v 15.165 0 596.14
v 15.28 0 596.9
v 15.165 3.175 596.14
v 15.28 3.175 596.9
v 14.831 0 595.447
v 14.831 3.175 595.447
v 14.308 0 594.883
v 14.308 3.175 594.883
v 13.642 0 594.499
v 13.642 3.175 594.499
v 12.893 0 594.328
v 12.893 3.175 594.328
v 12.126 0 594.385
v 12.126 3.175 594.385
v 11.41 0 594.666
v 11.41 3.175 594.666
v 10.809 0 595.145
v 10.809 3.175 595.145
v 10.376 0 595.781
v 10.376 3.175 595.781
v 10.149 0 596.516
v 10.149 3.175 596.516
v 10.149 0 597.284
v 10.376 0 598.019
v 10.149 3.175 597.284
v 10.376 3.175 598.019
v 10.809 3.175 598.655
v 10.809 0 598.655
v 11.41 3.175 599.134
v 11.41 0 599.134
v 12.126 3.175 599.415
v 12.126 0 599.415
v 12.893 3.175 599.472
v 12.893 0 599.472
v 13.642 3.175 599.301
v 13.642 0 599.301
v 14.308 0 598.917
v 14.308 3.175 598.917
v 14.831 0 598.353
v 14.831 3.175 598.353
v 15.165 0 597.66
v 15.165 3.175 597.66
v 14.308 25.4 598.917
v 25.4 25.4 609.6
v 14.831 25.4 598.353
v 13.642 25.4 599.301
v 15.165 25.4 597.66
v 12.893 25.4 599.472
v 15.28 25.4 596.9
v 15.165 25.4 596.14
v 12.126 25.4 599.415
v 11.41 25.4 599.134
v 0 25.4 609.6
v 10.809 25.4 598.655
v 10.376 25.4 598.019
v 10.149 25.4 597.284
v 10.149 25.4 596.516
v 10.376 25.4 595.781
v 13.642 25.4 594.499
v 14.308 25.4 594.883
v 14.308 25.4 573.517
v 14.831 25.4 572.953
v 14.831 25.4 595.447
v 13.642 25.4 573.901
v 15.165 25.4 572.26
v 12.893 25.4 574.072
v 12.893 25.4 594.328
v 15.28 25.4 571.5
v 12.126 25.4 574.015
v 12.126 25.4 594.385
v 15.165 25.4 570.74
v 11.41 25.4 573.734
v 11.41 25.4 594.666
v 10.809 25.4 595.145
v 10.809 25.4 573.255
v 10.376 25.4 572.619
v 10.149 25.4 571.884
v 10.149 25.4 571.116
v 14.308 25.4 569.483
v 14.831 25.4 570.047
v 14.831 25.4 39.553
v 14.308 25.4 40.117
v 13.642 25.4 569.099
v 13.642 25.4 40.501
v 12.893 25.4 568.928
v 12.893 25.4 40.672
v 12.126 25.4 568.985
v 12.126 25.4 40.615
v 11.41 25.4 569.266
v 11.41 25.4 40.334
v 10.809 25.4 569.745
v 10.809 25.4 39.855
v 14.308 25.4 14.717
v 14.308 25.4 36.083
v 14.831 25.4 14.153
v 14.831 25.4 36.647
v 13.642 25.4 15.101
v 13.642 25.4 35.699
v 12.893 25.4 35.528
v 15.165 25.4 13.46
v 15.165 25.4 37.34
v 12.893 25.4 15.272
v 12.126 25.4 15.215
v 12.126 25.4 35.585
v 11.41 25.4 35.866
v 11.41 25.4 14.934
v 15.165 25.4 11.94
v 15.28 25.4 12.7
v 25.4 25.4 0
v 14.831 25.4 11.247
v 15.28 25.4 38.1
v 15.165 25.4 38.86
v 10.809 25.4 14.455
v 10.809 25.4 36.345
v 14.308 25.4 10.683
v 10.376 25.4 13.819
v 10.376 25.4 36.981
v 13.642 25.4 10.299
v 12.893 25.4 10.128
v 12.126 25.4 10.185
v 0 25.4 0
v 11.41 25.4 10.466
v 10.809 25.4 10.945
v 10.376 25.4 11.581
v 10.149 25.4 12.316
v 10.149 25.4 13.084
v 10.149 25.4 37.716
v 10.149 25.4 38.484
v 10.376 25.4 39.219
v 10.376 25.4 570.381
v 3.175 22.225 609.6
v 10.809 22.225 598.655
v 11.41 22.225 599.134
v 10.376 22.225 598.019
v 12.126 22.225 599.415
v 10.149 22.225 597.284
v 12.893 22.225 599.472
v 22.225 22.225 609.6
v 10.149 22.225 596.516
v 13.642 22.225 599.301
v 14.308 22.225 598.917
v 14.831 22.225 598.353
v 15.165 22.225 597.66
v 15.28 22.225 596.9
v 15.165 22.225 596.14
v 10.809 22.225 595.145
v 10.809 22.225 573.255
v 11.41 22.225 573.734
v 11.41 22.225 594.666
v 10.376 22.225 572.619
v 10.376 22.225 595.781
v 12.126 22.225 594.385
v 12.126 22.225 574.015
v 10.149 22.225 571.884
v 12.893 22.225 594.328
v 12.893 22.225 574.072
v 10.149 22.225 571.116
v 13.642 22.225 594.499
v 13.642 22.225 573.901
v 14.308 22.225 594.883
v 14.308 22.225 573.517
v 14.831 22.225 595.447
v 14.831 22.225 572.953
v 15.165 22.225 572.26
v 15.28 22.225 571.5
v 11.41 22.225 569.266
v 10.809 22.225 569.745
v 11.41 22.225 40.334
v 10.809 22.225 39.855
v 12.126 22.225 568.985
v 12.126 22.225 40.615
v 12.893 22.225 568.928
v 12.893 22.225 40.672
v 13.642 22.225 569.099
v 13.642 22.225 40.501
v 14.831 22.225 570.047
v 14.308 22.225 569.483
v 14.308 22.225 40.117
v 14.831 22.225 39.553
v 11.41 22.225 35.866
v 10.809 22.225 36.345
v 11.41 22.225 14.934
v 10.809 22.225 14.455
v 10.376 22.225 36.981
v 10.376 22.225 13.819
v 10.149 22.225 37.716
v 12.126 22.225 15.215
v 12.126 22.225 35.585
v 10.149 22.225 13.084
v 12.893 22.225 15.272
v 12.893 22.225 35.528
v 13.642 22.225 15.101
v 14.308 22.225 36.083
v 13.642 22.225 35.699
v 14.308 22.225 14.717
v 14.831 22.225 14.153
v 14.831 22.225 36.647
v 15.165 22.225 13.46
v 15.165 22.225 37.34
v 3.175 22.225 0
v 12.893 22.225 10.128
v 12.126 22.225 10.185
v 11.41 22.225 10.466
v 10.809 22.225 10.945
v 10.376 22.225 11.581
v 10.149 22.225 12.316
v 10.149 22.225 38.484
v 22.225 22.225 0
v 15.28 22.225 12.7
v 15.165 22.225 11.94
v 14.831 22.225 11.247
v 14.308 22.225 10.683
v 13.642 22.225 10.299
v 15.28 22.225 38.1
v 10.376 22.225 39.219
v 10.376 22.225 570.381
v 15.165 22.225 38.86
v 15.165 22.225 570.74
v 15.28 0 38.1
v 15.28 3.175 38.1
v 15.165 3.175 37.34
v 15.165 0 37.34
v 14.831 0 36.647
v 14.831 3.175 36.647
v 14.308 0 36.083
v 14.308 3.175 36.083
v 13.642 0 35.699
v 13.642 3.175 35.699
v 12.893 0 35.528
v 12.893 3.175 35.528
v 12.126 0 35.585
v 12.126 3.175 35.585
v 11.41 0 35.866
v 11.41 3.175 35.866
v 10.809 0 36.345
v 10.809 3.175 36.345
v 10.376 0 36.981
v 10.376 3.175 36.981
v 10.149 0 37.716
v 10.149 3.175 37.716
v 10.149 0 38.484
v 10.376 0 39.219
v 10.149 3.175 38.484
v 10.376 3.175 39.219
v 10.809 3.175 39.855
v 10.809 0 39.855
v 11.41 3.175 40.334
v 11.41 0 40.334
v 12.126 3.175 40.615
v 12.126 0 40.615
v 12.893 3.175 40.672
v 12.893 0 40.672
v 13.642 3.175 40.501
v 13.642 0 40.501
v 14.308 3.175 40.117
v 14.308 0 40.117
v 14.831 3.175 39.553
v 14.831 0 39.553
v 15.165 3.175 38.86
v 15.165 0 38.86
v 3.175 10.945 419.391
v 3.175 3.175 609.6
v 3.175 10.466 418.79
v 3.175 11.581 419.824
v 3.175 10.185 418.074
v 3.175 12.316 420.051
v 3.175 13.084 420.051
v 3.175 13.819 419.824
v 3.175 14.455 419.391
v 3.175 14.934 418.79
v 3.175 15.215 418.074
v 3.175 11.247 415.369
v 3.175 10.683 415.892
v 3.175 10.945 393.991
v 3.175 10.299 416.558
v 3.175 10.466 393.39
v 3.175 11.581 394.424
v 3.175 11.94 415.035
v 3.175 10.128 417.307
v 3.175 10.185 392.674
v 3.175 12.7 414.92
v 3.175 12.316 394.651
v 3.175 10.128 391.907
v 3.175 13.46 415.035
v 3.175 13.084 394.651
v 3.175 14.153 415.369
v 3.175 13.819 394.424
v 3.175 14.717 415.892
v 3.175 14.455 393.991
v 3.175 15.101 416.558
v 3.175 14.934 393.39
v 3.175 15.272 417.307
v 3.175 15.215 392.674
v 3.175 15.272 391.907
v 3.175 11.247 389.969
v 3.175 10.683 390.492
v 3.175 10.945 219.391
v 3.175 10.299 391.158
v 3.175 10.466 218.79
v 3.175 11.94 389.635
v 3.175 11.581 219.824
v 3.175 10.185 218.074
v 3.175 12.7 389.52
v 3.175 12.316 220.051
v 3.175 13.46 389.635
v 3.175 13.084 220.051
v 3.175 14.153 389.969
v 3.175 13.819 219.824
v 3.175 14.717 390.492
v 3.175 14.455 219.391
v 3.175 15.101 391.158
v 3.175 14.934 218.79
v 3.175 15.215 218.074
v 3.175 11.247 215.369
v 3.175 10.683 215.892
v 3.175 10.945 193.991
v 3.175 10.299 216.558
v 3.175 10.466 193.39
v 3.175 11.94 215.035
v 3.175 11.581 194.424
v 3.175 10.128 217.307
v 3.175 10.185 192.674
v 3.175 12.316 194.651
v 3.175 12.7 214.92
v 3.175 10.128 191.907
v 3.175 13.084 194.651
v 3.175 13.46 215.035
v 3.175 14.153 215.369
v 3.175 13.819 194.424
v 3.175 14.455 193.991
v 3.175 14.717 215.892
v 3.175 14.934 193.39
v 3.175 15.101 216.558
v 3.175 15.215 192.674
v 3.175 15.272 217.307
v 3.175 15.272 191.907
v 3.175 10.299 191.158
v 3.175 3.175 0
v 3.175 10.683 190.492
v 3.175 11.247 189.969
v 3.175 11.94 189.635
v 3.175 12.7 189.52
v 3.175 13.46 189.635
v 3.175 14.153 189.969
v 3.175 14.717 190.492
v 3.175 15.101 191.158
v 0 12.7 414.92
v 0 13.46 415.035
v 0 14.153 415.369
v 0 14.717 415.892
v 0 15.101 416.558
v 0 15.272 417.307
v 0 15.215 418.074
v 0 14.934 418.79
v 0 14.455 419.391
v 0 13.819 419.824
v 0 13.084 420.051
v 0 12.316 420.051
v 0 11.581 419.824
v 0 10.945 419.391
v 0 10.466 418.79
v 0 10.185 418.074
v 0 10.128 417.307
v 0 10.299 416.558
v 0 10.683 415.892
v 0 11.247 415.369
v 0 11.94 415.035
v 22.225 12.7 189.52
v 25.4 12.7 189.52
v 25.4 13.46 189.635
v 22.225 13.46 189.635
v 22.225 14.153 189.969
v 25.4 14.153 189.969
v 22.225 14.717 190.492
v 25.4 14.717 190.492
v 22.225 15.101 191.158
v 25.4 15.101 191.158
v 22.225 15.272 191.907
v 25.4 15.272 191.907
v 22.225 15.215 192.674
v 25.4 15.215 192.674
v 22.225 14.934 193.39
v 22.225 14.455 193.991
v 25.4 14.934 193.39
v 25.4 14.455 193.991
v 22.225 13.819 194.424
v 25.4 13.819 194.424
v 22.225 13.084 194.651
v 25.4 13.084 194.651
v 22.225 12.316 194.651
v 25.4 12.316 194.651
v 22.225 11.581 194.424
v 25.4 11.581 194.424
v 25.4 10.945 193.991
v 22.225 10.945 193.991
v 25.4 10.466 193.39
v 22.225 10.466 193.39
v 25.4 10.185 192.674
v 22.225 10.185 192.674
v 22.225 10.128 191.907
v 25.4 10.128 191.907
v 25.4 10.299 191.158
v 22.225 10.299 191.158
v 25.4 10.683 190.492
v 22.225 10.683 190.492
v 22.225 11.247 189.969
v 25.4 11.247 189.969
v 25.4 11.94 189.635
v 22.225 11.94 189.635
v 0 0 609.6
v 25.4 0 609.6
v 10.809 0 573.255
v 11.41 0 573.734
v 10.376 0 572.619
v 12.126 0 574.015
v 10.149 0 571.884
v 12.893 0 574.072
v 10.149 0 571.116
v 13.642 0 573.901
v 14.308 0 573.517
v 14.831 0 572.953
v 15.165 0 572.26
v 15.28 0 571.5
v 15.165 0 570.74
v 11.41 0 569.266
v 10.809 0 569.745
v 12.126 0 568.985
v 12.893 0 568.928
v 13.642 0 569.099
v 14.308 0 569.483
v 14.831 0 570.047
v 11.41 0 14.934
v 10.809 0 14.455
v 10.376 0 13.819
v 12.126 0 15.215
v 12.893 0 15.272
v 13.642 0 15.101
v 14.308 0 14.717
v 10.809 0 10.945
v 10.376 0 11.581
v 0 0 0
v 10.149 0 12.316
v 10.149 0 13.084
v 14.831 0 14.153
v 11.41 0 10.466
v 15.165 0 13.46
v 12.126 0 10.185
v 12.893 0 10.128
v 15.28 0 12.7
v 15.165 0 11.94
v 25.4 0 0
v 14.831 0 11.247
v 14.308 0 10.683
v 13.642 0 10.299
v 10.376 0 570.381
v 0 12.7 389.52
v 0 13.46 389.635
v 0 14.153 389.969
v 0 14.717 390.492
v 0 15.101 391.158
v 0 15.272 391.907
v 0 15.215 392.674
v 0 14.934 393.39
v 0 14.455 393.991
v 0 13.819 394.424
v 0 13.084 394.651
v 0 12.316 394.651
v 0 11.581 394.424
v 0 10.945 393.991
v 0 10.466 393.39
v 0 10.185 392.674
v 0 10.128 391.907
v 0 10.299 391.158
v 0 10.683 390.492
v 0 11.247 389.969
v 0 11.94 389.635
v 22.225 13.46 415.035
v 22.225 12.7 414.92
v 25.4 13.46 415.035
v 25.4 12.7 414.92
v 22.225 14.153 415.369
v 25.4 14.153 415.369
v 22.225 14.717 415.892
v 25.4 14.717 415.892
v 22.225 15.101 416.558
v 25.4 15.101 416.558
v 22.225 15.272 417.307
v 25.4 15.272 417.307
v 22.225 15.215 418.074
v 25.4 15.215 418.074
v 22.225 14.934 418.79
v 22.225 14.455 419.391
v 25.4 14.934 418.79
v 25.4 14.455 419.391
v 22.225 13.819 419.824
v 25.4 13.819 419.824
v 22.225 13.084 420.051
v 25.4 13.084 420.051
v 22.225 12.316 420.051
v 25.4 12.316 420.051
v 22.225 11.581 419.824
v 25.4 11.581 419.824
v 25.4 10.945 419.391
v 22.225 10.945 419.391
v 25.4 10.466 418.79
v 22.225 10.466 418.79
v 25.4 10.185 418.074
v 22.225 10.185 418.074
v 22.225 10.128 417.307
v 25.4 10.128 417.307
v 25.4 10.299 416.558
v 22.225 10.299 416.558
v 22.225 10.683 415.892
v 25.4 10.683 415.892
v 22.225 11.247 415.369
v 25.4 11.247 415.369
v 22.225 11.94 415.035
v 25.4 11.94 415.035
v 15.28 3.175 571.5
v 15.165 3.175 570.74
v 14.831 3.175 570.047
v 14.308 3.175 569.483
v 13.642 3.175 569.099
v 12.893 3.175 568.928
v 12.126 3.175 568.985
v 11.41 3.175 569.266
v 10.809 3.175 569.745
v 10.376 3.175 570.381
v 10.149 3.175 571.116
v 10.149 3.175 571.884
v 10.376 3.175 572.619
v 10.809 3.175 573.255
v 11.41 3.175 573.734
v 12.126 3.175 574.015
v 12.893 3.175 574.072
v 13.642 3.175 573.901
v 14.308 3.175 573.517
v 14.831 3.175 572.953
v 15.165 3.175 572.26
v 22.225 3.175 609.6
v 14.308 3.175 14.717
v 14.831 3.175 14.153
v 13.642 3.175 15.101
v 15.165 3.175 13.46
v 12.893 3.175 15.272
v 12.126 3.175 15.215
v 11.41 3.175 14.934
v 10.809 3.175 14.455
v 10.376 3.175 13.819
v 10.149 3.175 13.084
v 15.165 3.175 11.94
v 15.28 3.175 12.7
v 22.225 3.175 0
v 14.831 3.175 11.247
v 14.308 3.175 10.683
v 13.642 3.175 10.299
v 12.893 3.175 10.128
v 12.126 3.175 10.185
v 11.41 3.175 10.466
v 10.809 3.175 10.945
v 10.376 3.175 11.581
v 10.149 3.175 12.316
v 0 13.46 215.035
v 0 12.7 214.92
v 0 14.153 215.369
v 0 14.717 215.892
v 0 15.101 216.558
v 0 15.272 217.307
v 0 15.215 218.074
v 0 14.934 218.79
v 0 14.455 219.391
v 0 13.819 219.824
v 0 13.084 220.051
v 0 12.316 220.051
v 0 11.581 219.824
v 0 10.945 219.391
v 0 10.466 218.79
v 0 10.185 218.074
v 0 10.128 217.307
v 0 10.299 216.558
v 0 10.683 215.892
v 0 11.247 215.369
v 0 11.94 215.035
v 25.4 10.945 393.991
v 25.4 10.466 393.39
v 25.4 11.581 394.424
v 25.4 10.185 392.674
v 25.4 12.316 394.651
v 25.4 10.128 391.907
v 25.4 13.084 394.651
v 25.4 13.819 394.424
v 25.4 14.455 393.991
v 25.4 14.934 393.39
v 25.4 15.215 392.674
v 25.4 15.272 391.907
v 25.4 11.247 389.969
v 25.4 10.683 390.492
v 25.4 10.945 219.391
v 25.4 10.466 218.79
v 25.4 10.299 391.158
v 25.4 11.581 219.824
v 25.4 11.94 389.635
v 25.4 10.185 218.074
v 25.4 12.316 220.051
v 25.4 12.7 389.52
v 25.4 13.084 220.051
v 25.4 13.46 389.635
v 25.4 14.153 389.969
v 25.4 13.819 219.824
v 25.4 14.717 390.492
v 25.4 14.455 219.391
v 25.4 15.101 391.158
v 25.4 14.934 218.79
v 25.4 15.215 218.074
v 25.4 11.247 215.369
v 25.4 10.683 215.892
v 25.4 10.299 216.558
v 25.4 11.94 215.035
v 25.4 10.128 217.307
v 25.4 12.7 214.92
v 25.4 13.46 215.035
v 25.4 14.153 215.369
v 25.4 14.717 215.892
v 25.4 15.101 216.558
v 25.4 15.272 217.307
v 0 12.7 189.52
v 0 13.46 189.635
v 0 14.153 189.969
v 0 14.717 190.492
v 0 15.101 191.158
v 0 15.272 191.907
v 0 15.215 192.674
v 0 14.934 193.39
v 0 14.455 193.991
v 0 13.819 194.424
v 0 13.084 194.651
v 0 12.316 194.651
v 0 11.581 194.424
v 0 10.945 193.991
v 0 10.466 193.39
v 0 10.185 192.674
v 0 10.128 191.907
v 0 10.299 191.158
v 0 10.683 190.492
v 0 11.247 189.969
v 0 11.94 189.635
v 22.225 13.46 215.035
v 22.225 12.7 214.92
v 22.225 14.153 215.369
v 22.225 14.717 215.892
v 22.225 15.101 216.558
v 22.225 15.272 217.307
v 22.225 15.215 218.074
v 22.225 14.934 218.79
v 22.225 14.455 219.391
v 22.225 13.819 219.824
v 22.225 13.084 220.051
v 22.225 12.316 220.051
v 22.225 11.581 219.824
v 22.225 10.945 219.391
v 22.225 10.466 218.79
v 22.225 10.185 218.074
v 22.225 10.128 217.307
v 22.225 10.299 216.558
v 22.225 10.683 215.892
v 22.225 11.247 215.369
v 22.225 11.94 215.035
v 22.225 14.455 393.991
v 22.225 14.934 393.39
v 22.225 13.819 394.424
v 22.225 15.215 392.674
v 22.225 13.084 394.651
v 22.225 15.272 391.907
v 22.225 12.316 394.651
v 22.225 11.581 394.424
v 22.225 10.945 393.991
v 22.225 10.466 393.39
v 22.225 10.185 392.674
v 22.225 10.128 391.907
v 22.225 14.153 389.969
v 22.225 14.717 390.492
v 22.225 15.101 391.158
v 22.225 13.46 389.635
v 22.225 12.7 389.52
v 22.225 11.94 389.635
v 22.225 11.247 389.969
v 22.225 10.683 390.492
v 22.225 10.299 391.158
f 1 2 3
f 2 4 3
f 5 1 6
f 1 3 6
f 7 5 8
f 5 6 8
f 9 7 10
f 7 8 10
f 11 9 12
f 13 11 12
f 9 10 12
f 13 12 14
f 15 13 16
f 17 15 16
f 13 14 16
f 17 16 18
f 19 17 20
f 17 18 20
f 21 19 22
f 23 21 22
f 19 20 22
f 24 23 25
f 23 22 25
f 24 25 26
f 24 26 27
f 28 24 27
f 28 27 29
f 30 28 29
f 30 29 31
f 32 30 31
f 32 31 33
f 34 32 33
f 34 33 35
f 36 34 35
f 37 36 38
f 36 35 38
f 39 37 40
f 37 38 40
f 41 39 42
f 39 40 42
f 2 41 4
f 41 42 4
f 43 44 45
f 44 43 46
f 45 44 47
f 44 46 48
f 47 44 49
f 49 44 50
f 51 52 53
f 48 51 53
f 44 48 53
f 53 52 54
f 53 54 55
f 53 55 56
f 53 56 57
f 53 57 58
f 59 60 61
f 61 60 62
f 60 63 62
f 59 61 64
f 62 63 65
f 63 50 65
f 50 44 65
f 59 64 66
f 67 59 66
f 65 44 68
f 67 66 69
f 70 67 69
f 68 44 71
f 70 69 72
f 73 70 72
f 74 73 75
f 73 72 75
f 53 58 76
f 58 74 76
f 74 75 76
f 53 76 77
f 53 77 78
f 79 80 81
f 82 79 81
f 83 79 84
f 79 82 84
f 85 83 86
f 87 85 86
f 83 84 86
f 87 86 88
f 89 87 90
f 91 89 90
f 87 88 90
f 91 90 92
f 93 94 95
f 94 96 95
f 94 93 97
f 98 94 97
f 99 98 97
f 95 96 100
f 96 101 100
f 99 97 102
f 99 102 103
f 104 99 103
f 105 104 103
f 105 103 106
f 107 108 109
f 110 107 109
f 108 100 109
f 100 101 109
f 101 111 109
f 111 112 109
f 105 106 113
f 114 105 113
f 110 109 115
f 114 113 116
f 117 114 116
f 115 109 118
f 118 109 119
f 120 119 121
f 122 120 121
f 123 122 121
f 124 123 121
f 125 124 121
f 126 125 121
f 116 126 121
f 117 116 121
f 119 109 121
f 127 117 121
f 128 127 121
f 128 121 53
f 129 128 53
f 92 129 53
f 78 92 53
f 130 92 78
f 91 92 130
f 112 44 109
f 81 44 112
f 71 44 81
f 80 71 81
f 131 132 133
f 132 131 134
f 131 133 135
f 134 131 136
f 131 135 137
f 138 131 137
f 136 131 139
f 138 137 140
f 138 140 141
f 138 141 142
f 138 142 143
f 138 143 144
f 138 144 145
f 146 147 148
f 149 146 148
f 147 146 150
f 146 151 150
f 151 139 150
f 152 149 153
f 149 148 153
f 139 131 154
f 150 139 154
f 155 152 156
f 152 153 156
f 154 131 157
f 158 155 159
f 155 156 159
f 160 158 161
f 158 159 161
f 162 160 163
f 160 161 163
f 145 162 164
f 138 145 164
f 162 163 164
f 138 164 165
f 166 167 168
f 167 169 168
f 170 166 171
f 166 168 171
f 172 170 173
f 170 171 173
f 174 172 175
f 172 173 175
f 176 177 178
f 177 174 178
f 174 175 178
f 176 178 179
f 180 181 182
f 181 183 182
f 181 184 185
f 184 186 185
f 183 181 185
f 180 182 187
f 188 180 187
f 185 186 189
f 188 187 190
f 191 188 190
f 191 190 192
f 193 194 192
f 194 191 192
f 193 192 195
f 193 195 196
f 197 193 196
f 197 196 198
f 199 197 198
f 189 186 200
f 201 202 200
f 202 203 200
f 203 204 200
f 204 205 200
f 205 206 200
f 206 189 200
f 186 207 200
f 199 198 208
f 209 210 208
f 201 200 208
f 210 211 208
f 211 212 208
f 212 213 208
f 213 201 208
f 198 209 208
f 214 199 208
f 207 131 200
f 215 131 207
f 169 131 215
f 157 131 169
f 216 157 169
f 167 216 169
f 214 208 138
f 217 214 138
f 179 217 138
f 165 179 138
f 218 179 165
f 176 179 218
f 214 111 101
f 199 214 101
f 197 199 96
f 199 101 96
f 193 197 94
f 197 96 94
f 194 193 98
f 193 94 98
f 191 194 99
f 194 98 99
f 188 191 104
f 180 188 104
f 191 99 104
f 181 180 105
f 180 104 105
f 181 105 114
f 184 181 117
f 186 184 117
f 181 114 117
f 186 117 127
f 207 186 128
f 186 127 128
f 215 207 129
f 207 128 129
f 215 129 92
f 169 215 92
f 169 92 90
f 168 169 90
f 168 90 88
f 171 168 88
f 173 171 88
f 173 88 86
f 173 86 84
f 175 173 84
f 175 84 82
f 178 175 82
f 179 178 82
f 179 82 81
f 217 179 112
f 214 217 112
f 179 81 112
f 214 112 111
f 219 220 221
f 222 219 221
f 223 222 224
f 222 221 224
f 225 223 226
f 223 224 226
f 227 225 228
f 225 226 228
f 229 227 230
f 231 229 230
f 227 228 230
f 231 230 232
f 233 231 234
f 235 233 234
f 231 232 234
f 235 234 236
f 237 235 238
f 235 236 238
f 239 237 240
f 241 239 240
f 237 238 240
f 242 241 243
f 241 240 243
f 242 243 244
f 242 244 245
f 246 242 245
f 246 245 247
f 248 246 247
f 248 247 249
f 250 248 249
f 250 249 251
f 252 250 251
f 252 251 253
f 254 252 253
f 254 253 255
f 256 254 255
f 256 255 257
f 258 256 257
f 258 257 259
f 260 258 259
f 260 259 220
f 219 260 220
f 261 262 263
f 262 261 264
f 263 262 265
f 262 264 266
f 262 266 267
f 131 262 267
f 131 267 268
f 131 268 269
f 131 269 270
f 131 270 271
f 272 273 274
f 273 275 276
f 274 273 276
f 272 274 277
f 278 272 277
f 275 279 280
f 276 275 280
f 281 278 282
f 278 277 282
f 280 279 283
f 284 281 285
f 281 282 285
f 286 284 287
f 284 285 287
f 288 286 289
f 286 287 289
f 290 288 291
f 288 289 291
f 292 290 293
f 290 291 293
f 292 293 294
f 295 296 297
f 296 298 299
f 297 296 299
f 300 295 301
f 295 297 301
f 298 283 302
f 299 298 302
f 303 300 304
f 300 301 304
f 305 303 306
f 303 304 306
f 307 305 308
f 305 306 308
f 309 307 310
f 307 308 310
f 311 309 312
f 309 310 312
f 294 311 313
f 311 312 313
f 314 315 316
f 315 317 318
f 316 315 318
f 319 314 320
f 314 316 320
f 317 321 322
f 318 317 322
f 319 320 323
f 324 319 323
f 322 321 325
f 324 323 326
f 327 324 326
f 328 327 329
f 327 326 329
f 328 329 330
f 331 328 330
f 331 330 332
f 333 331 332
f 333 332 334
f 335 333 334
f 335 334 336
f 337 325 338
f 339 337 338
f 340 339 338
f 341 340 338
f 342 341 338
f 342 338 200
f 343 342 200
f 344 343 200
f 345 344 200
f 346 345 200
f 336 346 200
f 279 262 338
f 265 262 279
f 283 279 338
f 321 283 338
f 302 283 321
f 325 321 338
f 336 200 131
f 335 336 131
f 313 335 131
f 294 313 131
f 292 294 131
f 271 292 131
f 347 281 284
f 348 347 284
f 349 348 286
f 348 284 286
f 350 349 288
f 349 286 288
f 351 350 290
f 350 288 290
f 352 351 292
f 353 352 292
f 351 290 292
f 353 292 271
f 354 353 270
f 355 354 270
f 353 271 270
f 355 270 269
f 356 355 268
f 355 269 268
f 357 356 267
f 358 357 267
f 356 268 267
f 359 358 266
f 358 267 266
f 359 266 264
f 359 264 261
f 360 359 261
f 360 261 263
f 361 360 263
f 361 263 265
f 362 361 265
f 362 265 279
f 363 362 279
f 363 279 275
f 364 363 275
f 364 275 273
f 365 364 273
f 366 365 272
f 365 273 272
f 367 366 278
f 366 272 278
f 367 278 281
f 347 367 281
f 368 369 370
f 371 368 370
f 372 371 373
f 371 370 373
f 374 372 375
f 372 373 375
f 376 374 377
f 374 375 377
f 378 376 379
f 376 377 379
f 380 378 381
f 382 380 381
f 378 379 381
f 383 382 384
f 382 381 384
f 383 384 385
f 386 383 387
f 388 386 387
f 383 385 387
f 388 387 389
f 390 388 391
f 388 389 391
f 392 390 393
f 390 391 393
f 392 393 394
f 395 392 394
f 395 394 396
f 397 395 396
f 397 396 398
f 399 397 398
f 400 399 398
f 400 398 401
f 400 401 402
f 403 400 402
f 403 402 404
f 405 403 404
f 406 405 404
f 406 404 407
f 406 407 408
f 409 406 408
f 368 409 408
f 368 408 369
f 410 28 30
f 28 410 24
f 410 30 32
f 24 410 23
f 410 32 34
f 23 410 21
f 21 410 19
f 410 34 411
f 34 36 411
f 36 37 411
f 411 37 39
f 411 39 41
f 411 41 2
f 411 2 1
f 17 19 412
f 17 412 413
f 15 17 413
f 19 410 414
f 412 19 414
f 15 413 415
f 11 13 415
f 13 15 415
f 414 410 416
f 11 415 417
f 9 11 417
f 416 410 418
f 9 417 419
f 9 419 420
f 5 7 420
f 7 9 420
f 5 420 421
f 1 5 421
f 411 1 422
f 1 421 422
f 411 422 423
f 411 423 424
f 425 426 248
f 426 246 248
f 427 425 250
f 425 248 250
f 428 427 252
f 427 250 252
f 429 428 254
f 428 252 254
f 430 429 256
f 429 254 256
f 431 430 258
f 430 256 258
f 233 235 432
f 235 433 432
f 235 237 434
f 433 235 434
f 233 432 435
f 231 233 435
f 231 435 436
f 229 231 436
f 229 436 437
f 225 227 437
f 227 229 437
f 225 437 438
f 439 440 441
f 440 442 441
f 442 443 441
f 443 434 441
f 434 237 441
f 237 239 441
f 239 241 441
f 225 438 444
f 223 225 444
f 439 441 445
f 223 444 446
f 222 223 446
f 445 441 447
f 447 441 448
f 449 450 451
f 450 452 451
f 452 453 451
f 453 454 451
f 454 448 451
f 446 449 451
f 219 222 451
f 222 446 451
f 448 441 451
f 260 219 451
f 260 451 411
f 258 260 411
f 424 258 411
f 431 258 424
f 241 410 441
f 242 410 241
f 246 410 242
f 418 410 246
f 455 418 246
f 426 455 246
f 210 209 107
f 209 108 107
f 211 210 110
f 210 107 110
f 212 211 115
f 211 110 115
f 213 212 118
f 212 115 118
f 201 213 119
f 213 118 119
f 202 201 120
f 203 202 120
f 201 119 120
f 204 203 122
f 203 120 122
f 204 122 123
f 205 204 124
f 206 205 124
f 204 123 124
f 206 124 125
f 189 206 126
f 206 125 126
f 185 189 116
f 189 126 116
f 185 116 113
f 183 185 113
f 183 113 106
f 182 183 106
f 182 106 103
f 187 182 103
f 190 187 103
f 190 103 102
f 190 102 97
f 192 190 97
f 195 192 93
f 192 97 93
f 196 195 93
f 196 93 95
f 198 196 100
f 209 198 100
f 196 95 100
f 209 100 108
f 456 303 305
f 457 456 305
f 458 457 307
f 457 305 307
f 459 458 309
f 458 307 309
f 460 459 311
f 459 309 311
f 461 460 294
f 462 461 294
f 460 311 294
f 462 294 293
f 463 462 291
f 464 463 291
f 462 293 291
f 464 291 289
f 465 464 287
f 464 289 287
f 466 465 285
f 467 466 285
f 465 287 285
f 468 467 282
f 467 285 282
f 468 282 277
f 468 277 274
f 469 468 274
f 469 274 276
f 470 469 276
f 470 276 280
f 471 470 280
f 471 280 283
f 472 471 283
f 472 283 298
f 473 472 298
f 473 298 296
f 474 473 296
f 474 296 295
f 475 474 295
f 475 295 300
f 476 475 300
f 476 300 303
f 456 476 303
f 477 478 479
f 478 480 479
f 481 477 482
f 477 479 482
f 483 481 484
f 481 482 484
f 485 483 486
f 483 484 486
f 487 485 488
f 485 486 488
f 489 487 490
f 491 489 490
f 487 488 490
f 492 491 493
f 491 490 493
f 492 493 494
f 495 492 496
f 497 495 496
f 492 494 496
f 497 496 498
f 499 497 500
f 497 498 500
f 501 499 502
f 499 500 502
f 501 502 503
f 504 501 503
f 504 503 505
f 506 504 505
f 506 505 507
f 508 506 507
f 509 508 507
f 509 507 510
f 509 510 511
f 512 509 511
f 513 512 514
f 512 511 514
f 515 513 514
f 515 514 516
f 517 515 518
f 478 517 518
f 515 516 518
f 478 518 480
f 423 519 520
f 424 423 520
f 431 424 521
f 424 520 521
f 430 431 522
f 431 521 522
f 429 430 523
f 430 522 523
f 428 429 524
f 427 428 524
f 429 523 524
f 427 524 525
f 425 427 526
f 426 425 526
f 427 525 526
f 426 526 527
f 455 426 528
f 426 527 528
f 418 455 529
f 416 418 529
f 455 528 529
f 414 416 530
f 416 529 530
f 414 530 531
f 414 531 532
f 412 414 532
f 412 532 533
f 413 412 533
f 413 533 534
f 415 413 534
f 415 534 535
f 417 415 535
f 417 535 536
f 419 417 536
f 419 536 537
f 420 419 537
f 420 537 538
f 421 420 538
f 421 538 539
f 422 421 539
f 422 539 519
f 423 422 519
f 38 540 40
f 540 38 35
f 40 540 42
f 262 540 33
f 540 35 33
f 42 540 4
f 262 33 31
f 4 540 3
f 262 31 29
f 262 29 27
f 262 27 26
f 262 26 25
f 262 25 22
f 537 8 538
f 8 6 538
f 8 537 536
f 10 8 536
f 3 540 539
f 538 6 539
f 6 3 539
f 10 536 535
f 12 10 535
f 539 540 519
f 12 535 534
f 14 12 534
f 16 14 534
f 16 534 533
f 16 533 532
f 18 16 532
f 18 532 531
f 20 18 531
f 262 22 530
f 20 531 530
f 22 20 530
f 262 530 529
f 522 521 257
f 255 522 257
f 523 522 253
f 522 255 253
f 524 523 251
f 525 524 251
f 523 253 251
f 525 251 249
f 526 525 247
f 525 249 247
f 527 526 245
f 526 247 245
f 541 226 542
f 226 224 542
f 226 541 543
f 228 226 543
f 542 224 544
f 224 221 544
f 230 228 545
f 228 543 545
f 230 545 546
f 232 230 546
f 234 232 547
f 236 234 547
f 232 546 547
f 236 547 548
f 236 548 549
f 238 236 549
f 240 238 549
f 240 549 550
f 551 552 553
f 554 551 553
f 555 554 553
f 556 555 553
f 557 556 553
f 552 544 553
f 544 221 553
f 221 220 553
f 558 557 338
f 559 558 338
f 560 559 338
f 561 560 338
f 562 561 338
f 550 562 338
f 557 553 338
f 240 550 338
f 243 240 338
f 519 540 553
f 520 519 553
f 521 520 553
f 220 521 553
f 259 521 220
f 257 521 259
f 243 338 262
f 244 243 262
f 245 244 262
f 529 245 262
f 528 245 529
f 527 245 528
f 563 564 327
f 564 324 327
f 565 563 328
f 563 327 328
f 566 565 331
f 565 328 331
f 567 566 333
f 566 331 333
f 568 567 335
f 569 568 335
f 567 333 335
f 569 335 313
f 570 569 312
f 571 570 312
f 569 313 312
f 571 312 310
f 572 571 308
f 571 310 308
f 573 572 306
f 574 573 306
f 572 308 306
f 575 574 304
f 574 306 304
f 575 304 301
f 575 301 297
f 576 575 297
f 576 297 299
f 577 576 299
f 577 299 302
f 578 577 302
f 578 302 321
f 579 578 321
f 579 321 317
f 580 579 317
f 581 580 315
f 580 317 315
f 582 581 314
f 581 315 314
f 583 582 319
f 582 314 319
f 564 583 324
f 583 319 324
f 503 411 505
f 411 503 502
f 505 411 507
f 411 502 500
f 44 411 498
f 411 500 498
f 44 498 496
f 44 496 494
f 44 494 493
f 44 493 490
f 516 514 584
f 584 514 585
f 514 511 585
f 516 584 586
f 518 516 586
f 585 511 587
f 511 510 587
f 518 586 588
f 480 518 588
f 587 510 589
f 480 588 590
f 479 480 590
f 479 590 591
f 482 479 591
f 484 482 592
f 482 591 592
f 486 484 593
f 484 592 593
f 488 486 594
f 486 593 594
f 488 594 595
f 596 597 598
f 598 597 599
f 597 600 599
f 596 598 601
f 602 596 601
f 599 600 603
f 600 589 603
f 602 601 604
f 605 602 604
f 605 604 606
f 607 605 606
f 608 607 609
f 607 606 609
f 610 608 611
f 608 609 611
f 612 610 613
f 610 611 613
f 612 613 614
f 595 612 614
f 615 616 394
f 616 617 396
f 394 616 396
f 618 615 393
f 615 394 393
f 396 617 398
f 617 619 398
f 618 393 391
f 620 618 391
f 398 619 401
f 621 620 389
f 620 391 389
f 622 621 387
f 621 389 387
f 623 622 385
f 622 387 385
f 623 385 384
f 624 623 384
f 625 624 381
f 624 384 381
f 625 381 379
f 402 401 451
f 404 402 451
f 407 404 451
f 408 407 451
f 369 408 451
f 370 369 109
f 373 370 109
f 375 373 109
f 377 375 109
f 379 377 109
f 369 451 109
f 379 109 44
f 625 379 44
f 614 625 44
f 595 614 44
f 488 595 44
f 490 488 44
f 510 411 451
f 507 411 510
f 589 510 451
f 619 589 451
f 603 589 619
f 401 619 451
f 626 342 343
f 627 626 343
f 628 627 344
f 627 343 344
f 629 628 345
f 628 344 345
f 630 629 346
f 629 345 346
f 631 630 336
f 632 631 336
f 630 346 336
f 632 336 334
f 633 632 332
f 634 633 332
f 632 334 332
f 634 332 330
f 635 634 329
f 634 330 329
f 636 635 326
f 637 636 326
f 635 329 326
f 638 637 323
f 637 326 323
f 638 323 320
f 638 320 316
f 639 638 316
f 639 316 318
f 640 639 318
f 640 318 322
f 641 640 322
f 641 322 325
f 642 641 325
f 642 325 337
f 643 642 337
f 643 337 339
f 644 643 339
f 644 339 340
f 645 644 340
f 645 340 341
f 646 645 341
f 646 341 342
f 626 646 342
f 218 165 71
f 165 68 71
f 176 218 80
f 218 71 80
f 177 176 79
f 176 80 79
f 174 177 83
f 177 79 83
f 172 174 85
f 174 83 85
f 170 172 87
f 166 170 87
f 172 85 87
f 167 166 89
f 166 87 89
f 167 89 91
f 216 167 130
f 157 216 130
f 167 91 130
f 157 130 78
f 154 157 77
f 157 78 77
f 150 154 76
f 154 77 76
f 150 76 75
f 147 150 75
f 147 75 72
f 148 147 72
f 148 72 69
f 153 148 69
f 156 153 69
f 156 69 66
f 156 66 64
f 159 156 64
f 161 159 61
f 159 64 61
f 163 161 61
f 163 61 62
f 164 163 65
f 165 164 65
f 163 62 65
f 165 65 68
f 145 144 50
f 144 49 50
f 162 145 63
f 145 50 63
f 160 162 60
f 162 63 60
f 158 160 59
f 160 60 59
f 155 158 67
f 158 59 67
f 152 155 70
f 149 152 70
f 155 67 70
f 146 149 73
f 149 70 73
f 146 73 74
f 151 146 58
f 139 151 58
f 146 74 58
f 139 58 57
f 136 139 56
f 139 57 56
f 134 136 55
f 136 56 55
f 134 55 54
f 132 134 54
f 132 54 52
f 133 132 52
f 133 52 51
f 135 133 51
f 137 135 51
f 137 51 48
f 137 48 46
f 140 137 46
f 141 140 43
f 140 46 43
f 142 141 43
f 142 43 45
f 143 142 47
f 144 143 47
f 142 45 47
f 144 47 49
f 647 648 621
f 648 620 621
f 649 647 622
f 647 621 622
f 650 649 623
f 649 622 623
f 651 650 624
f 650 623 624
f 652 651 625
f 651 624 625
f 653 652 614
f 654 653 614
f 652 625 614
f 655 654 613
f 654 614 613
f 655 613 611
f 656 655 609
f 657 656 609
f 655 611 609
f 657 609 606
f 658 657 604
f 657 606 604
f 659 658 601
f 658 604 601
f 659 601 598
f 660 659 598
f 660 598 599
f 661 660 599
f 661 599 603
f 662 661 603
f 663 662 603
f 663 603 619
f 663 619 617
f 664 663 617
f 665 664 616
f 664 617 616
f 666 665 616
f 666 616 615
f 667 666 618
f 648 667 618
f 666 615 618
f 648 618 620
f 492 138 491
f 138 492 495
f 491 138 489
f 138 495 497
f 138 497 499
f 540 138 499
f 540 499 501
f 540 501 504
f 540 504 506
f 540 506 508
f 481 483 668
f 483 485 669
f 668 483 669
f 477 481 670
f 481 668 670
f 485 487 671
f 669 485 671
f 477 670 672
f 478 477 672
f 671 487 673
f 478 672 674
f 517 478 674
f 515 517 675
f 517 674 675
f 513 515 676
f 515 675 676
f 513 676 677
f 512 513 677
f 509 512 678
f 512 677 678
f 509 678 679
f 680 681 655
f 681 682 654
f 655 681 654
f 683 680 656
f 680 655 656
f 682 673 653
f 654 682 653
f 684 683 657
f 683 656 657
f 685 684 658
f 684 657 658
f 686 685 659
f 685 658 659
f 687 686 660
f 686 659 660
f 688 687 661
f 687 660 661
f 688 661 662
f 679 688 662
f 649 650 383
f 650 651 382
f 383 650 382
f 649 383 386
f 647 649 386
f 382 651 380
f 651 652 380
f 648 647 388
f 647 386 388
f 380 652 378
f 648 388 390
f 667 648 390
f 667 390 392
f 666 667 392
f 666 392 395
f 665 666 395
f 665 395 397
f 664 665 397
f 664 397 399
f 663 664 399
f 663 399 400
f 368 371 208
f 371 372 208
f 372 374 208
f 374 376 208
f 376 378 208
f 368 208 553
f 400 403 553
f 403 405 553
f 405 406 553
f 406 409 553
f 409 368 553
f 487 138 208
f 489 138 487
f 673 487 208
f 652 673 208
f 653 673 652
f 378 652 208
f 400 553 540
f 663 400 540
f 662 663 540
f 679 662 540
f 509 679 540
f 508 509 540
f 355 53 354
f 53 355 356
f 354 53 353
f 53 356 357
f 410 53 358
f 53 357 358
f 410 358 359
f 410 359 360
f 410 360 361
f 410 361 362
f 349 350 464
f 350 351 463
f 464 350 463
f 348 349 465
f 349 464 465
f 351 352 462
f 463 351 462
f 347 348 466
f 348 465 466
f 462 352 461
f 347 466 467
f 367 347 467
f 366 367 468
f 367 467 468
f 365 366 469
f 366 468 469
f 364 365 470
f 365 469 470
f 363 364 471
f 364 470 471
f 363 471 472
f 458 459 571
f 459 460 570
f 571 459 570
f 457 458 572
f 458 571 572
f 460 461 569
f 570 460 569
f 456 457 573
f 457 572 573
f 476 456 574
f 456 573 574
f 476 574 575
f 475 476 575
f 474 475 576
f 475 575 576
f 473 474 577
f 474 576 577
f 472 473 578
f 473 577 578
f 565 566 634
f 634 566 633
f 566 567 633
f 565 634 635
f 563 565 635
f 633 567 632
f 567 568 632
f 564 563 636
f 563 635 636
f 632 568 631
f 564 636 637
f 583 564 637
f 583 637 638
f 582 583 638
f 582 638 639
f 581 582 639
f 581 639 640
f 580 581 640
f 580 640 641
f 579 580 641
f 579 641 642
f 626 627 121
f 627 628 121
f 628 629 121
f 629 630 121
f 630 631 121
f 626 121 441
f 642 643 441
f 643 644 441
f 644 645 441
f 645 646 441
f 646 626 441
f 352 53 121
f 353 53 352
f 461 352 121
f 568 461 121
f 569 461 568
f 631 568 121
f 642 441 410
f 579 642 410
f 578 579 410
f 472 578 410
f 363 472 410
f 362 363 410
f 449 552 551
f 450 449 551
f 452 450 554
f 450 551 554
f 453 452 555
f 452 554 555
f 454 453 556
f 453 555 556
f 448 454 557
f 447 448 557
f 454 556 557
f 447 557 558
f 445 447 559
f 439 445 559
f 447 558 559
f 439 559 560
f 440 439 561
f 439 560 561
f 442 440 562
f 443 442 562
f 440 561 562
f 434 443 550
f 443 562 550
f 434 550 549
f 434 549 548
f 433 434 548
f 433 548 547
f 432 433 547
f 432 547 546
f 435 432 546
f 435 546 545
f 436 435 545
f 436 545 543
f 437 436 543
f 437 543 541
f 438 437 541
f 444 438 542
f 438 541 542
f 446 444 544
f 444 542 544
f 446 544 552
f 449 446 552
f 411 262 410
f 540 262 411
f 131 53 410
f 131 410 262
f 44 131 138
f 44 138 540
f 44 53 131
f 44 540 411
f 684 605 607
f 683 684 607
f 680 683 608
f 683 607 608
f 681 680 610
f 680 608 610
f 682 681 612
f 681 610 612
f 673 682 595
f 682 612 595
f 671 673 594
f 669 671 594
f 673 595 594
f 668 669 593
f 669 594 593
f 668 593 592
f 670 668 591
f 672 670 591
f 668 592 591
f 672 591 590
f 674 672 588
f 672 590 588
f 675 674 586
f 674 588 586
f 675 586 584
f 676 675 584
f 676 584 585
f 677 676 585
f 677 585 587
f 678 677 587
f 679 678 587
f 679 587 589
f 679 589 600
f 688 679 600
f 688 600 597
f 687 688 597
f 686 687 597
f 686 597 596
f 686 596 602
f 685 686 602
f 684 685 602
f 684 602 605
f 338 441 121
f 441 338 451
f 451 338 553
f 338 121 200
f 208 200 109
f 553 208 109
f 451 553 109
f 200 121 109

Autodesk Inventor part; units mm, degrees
ref_plane "YZ Plane" through (0, 0, 0) normal (1, 0, 0) x (0, 1, 0)
ref_plane "XZ Plane" through (0, 0, 0) normal (0, 1, 0) x (-1, 0, 0)
ref_plane "XY Plane" through (0, 0, 0) normal (0, 0, 1) x (1, 0, 0)
sketch "Sketch1" plane through (0, 0, 0) normal (0, 0, 1) x (1, 0, 0)
  line L0 (0, 0) -> (25.4, 0)
  line L1 (25.4, 0) -> (25.4, 25.4)
  line L2 (25.4, 25.4) -> (0, 25.4)
  line L3 (0, 25.4) -> (0, 0)
  line L4 (3.175, 22.225) -> (22.225, 22.225)
  line L5 (22.225, 22.225) -> (22.225, 3.175)
  line L6 (22.225, 3.175) -> (3.175, 3.175)
  line L7 (3.175, 3.175) -> (3.175, 22.225)
  dimension "d0" = 25.4
  dimension "d1" = 25.4
  dimension "d2" = 3.175
extrude "Extrusion1" add sketch "Sketch1" along normal blind 609.6
sketch "Sketch2" plane through (0, 25.4, 0) normal (0, 1, 0) x (1, 0, 0)
  line L0 (22.225, 0) -> (3.175, 0) construction
  line L1 (12.7, 0) -> (12.7, -12.7) construction
  line L2 (12.7, -12.7) -> (12.7, -38.1) construction
  line L3 (0, 0) -> (0, -609.6) construction
  line L4 (0, -304.8) -> (25.4, -304.8) construction
  line L5 (25.4, 0) -> (25.4, -609.6) construction
  circle A0 centre (12.7, -38.1) radius 2.5797
  circle A1 centre (12.7, -12.7) radius 2.5797
  circle A2 centre (12.7, -571.5) radius 2.5797
  circle A3 centre (12.7, -596.9) radius 2.5797
  dimension "d5" = 12.7
  dimension "d6" = 25.4
  dimension "d7" = 5.1594
extrude "Extrusion2" cut sketch "Sketch2" against normal blind 609.6
sketch "Sketch3" plane through (25.4, 0, 0) normal (1, 0, 0) x (0, 0, -1)
  line L0 (0, 25.4) -> (-609.6, 25.4) construction
  line L1 (-304.8, 25.4) -> (-304.8, 0) construction
  line L2 (-304.8, 12.7) -> (-204.8, 12.7) construction
  line L3 (-204.8, 12.7) -> (-217.5, 12.7) construction
  line L4 (-217.5, 12.7) -> (-192.1, 12.7) construction
  circle A0 centre (-217.5, 12.7) radius 2.5797
  circle A1 centre (-192.1, 12.7) radius 2.5797
  circle A2 centre (-392.1, 12.7) radius 2.5797
  circle A3 centre (-417.5, 12.7) radius 2.5797
  point P0 (0, 0)
  dimension "d10" = 100
  dimension "d11" = 12.7
  dimension "d12" = 25.4
  dimension "d13" = 5.1594
extrude "Extrusion3" cut sketch "Sketch3" against normal blind 25.4
properties part number "2ft 1x1"
